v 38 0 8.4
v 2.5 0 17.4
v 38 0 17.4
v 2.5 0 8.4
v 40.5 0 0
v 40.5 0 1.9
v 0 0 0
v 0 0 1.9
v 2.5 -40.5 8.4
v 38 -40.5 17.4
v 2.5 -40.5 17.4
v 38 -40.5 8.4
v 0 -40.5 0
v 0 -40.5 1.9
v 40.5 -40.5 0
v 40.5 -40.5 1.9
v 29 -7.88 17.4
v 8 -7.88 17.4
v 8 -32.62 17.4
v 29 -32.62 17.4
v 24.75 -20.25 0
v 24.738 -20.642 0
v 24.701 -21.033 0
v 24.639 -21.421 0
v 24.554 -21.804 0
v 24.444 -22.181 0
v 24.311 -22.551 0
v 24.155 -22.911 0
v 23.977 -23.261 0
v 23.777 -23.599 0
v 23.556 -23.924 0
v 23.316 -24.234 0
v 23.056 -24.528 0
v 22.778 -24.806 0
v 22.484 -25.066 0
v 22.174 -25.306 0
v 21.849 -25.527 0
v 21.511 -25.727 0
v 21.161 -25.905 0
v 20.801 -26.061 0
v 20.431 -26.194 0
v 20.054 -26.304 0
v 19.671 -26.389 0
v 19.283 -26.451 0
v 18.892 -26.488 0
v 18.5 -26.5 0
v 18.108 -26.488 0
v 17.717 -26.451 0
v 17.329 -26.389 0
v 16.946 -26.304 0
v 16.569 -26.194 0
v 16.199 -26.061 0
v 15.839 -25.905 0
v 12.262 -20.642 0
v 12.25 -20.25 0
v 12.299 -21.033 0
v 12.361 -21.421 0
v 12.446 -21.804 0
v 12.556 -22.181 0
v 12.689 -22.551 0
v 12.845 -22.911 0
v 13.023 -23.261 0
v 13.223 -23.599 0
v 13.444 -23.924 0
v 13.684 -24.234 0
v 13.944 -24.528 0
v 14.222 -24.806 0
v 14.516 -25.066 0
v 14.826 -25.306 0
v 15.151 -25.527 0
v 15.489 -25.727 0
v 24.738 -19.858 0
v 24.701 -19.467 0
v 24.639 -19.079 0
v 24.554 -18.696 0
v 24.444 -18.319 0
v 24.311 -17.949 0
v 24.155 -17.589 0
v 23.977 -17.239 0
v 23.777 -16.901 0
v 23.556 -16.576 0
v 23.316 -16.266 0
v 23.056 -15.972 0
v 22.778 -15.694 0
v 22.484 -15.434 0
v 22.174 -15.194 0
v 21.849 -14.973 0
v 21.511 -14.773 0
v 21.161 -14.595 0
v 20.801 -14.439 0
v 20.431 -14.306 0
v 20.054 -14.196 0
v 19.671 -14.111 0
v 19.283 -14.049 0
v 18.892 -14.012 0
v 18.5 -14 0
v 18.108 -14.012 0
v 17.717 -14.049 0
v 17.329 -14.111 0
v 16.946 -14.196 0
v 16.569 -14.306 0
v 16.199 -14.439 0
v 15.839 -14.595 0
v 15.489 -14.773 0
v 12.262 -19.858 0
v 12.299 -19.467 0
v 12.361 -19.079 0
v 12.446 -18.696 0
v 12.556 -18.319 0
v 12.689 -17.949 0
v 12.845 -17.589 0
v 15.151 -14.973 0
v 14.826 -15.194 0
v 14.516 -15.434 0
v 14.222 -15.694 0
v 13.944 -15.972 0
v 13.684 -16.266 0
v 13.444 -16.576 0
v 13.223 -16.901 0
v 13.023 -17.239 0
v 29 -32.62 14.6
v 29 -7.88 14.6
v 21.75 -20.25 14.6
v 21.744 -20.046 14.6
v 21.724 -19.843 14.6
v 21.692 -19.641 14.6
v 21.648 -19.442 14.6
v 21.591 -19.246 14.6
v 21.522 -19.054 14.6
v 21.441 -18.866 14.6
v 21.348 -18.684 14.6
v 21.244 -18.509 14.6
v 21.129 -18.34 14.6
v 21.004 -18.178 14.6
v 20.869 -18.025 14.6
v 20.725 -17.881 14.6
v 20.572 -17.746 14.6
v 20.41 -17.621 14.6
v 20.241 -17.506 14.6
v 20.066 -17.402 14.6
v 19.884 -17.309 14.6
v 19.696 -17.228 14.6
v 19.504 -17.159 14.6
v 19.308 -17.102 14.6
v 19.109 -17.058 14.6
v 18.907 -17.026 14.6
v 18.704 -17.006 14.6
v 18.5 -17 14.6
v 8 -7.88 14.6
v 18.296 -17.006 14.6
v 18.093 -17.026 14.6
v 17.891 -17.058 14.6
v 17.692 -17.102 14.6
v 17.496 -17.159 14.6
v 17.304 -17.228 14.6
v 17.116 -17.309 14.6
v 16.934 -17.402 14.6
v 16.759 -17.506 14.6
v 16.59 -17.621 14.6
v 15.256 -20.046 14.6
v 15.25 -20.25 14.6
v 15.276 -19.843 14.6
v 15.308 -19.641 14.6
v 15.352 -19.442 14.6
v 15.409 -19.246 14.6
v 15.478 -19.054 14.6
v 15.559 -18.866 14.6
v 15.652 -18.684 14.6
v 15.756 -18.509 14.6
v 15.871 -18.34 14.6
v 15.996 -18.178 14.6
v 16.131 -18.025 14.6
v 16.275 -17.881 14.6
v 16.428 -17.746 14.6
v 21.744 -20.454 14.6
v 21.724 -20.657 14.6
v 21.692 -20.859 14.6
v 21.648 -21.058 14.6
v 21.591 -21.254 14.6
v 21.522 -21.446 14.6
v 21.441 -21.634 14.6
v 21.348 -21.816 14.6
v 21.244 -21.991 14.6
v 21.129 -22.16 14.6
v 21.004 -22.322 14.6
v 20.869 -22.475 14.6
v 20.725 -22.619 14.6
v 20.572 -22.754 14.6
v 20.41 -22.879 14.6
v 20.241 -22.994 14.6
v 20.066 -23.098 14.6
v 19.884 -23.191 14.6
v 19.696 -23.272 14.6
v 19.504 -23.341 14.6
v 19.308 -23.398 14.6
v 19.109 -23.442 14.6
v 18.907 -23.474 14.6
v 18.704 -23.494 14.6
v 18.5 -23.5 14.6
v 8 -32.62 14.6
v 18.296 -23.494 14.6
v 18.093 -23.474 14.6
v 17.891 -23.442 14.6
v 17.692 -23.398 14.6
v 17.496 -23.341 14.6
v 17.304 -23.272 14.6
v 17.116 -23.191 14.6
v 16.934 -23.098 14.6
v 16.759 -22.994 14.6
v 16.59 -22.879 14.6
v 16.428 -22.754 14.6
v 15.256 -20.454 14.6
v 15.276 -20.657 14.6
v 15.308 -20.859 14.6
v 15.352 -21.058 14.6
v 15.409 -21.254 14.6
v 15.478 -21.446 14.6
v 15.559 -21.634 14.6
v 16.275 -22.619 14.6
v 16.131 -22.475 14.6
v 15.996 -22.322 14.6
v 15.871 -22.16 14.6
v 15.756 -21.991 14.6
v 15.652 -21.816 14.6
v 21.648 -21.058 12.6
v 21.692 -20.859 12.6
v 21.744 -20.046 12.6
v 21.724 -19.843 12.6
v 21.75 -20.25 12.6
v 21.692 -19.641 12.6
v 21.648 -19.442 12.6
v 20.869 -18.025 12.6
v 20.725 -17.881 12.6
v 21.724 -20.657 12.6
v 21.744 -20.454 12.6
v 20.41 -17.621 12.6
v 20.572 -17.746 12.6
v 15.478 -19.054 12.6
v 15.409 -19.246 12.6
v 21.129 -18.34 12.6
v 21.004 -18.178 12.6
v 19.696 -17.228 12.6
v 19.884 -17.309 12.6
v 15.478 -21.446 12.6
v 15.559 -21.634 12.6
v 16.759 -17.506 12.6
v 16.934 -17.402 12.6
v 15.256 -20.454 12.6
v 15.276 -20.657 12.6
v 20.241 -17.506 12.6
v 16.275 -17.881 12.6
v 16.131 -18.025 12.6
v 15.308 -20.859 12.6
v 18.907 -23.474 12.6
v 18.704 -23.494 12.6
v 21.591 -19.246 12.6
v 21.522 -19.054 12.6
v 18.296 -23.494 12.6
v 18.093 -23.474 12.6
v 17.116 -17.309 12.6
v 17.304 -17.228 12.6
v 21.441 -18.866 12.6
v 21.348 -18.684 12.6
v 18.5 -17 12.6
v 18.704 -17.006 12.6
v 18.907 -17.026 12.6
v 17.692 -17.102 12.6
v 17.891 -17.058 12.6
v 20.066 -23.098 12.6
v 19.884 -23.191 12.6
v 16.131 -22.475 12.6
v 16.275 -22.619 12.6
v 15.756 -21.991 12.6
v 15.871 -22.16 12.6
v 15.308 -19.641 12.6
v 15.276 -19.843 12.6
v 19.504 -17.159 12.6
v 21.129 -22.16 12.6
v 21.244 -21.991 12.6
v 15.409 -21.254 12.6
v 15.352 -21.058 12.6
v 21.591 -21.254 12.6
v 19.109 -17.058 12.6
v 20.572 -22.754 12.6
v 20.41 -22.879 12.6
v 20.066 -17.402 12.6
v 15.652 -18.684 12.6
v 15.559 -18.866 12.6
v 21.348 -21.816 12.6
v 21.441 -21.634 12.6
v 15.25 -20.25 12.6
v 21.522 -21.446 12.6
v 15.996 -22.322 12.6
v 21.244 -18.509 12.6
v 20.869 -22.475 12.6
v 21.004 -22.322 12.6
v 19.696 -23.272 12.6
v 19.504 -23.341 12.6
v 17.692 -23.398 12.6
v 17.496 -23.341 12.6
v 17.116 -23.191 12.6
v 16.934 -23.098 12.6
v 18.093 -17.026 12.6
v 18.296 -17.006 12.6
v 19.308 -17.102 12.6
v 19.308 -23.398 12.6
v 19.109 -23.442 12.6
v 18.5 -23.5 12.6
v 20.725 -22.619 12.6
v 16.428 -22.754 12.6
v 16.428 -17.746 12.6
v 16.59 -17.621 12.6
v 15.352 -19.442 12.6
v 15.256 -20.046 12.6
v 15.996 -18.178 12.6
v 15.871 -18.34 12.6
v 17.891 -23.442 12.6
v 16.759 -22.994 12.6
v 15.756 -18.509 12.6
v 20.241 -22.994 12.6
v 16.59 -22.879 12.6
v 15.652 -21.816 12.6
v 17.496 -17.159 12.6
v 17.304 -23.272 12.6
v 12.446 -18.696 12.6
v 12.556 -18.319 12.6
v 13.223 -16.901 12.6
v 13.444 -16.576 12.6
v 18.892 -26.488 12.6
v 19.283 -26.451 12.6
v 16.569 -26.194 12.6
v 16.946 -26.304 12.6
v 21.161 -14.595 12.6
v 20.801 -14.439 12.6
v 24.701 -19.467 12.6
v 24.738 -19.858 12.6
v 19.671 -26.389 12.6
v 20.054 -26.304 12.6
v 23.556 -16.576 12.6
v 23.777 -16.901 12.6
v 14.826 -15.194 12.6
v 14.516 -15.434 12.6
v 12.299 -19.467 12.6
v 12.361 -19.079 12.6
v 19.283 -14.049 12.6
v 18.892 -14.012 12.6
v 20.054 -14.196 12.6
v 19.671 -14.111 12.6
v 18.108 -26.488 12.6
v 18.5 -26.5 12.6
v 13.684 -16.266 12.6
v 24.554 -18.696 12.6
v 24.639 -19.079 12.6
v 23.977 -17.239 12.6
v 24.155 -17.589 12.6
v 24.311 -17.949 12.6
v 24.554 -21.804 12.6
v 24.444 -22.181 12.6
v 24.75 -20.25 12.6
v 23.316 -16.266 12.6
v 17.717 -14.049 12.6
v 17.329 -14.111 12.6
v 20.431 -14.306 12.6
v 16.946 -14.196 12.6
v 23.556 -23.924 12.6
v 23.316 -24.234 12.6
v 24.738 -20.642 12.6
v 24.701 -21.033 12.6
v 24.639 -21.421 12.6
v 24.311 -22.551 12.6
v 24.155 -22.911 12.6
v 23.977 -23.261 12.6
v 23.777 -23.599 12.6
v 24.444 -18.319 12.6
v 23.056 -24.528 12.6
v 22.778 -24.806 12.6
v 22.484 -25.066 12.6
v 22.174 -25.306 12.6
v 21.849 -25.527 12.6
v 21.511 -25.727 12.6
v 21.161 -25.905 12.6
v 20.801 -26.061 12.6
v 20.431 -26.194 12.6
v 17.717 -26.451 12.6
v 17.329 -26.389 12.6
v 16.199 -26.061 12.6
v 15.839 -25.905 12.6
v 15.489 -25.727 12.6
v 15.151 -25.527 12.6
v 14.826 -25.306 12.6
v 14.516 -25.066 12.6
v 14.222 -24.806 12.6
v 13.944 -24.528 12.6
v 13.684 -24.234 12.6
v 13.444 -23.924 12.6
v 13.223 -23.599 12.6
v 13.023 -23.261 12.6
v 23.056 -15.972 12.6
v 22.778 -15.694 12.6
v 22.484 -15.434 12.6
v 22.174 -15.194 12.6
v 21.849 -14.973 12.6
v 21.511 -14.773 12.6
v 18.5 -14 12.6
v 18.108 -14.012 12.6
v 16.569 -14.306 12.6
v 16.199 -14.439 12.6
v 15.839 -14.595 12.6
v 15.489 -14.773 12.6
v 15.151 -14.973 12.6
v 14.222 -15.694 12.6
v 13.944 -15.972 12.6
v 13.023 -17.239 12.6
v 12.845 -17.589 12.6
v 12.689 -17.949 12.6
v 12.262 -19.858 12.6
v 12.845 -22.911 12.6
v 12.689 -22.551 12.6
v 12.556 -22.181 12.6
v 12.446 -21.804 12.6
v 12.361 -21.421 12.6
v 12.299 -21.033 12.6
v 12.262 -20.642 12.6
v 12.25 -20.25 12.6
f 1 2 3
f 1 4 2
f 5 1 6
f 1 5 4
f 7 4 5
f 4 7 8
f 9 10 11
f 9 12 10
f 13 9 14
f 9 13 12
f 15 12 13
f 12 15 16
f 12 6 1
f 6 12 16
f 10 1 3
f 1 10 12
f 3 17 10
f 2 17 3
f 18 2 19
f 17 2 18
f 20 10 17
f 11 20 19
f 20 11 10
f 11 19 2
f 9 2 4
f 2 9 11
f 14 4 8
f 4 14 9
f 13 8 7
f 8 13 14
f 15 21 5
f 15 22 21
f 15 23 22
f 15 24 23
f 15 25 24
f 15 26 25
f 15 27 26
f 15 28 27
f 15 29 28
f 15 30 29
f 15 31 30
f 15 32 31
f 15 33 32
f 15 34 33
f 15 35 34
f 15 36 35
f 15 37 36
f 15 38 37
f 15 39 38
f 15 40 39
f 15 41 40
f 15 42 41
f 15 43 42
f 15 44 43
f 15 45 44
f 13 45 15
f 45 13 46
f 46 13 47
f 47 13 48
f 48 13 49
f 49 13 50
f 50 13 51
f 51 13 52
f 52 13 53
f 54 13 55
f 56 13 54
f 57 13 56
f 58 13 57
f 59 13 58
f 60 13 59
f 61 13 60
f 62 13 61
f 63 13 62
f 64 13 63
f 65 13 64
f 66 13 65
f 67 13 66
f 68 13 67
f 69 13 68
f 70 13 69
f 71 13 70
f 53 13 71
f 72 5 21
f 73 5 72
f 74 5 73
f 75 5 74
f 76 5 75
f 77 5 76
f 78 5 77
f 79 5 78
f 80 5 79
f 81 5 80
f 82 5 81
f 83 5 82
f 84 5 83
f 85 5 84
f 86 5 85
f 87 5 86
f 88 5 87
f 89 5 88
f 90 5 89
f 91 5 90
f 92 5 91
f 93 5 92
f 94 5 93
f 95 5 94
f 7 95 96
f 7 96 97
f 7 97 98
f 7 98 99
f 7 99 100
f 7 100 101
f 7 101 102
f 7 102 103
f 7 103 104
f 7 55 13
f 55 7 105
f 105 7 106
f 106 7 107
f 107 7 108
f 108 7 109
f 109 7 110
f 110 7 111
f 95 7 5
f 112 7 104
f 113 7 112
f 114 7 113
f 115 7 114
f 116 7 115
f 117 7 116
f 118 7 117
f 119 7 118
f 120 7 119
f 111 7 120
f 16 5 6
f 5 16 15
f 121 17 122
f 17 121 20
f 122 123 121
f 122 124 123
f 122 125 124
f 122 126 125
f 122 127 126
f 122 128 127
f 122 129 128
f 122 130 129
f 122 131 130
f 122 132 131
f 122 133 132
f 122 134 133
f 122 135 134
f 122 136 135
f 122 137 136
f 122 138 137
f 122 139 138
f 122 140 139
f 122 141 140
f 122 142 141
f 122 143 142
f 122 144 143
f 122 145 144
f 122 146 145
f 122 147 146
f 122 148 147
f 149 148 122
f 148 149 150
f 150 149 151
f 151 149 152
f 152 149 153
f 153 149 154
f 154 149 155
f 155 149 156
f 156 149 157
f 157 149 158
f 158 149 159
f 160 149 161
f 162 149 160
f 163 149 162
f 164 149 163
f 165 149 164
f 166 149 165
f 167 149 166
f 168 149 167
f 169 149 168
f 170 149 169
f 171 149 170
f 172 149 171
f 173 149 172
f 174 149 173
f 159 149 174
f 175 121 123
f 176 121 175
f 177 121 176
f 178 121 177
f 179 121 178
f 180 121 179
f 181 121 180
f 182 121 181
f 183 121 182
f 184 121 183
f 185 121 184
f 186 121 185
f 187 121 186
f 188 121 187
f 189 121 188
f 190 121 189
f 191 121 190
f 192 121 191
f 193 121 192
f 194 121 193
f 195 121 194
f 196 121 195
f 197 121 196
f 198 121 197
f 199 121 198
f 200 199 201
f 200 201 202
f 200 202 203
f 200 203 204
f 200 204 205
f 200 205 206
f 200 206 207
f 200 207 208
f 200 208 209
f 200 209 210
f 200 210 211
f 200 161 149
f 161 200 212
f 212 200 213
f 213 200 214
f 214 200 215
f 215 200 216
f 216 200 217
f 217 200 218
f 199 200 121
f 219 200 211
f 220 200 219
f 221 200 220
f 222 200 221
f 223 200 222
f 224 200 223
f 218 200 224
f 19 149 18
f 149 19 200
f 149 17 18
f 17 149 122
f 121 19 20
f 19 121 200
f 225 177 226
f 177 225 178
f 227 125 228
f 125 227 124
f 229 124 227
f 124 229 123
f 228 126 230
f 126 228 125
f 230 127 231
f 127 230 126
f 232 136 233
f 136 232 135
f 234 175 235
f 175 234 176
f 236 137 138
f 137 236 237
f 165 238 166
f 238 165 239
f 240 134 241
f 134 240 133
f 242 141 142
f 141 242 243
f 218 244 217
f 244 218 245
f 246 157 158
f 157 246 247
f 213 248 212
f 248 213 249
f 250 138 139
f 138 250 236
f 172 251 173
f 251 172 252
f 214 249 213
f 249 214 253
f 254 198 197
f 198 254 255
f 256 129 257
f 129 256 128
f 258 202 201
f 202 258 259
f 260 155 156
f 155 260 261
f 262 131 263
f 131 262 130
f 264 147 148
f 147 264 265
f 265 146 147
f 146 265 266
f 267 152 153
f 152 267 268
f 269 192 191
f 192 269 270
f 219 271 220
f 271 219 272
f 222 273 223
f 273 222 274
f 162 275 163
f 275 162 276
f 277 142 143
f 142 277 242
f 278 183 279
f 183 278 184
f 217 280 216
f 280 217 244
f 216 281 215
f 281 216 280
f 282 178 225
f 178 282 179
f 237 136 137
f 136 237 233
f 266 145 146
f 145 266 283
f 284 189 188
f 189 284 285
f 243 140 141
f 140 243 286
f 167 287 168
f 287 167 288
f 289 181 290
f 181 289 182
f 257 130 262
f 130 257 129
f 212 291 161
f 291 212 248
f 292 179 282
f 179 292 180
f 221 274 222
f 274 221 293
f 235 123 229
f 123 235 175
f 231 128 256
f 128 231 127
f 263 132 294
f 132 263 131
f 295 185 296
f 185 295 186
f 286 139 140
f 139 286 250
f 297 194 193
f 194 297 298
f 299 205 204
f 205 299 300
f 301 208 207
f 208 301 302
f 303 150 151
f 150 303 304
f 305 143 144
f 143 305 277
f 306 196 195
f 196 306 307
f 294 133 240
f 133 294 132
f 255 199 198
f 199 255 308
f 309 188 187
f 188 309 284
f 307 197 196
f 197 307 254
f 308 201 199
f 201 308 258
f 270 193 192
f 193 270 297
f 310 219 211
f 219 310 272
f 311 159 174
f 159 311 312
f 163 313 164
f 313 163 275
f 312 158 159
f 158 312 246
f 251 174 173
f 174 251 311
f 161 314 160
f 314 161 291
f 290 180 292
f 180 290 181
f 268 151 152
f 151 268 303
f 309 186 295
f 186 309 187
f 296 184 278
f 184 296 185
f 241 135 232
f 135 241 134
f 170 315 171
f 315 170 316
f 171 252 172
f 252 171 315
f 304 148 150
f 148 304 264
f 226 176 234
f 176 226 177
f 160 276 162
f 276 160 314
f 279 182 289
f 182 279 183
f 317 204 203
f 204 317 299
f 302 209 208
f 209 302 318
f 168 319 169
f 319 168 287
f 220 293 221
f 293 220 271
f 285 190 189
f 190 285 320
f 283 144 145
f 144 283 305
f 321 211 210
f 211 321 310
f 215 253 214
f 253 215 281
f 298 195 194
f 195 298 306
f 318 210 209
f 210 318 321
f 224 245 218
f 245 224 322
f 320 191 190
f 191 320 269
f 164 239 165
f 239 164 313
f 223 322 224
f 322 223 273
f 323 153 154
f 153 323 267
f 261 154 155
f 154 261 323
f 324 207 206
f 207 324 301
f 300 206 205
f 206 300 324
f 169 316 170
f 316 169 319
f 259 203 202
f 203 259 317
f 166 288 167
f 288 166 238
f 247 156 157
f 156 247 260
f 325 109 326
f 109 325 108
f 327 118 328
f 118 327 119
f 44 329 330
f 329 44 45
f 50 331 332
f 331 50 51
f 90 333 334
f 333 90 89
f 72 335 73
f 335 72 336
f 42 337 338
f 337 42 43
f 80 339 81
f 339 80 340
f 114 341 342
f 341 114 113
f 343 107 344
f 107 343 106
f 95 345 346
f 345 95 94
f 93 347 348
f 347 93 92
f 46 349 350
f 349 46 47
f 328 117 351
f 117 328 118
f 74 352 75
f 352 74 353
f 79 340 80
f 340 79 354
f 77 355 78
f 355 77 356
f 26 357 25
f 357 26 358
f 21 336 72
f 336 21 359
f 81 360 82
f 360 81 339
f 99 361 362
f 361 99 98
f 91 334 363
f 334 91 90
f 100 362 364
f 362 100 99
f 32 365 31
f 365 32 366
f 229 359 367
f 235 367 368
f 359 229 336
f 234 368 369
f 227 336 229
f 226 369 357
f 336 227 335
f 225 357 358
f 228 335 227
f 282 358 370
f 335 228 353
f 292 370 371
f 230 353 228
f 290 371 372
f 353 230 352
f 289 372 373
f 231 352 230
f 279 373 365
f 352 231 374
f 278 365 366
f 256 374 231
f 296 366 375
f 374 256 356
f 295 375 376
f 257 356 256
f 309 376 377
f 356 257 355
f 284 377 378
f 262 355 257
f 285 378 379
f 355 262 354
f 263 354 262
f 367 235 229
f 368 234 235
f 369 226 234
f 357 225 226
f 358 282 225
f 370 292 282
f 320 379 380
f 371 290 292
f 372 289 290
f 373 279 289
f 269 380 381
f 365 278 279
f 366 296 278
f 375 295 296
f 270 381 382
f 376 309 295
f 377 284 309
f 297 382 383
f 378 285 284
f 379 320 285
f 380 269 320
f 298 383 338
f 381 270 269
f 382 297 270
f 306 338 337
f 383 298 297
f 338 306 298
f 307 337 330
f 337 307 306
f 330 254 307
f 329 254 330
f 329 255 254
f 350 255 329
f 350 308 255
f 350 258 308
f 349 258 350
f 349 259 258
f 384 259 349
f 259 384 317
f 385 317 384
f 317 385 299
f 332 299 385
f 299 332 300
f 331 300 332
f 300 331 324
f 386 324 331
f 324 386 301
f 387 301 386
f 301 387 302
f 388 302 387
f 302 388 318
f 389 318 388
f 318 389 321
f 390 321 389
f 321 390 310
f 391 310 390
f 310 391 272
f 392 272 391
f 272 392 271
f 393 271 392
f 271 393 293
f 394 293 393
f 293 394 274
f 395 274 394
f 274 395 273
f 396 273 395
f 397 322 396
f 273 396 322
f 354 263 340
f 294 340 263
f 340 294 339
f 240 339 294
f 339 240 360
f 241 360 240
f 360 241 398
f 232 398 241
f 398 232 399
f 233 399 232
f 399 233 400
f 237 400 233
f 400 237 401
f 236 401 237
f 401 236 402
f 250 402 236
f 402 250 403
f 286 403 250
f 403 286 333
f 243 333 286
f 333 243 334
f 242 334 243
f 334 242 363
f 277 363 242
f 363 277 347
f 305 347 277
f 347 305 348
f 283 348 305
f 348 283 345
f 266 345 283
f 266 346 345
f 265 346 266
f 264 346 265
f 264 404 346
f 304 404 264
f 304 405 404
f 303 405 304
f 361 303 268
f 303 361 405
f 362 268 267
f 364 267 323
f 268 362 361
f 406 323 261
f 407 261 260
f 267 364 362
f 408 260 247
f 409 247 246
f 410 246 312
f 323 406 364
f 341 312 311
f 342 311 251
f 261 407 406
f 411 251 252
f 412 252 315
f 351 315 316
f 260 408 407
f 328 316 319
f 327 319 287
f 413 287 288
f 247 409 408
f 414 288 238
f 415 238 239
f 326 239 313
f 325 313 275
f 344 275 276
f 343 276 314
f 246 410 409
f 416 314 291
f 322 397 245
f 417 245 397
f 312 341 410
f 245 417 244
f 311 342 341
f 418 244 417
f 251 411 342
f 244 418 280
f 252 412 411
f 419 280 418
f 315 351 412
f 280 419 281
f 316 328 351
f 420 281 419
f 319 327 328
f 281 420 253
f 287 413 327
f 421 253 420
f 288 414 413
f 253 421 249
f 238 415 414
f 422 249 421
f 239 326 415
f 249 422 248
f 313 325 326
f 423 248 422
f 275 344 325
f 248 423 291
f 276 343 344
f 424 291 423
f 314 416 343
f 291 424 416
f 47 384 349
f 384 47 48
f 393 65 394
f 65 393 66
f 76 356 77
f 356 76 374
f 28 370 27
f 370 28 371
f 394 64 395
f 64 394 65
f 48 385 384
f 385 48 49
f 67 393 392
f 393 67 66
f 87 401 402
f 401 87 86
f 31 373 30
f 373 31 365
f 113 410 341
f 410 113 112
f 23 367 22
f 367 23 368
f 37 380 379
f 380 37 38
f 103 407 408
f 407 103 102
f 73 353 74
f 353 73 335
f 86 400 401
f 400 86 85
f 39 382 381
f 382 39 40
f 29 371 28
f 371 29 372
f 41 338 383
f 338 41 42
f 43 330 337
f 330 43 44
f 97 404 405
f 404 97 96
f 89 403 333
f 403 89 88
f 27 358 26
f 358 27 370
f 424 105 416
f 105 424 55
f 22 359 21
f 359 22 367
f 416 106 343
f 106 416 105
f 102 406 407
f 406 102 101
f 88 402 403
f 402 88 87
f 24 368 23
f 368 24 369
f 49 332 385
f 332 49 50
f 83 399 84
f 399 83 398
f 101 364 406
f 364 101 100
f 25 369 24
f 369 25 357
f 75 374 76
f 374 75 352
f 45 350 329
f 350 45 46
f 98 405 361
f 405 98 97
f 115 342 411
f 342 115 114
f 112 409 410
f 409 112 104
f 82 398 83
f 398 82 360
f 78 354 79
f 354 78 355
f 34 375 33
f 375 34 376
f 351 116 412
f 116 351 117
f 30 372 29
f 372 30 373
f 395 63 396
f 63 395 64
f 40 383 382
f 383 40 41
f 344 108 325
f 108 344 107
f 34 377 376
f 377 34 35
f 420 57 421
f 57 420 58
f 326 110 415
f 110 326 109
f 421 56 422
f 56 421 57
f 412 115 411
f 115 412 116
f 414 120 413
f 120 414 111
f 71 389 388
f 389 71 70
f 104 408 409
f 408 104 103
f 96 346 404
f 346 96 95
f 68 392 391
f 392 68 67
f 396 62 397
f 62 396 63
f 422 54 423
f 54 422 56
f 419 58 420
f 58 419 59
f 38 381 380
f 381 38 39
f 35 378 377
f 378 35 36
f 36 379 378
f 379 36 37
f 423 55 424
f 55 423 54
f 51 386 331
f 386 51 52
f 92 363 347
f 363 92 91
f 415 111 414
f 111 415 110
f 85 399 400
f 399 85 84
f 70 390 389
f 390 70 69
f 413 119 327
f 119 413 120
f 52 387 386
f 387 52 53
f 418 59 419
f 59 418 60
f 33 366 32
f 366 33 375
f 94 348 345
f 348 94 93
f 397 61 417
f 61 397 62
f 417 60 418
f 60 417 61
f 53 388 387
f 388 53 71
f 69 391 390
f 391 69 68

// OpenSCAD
// Setup
$fn = 100;
$fa = 1;
$fs = 0.4;

// tripod
width   = 40.5;
tapered = 35.5;
depth   = 8.4;
lip     = 1.9;
taper   = (width - tapered) / 2.0;
extra   = 9.0;

// level
// 'bulge'
tolerance = 0.3;
lwidth    = 20.7 + tolerance;
llength   = 24.44 + tolerance;
ldepth    = 2.5 + tolerance;
center    = 16.0;
adjust    = (tapered / 2.0) - center;

// bolt
hole = 6.5;
head = 12.5;
thicky = 2.0;

difference() {
    rotate([90,0,0])
    linear_extrude(width) {
        polygon([[0,0],[0,lip],[taper,depth],
                 [taper,depth+extra],[width-taper,depth+extra],
                 [width-taper,depth],[width,lip],[width,0]]);
    }
    translate([(width / 2.0) - adjust,-width/2.0,depth+extra-ldepth/2]) cube([lwidth,llength,ldepth],center=true);
    translate([(width / 2.0) - adjust,-width/2.0,(depth+extra)/2]) cylinder(h=depth+extra,d=hole,center=true);
    translate([(width / 2.0) - adjust,-width/2.0,(depth+extra)/2-ldepth-thicky]) cylinder(h=depth+extra, d=head,center=true);
}
